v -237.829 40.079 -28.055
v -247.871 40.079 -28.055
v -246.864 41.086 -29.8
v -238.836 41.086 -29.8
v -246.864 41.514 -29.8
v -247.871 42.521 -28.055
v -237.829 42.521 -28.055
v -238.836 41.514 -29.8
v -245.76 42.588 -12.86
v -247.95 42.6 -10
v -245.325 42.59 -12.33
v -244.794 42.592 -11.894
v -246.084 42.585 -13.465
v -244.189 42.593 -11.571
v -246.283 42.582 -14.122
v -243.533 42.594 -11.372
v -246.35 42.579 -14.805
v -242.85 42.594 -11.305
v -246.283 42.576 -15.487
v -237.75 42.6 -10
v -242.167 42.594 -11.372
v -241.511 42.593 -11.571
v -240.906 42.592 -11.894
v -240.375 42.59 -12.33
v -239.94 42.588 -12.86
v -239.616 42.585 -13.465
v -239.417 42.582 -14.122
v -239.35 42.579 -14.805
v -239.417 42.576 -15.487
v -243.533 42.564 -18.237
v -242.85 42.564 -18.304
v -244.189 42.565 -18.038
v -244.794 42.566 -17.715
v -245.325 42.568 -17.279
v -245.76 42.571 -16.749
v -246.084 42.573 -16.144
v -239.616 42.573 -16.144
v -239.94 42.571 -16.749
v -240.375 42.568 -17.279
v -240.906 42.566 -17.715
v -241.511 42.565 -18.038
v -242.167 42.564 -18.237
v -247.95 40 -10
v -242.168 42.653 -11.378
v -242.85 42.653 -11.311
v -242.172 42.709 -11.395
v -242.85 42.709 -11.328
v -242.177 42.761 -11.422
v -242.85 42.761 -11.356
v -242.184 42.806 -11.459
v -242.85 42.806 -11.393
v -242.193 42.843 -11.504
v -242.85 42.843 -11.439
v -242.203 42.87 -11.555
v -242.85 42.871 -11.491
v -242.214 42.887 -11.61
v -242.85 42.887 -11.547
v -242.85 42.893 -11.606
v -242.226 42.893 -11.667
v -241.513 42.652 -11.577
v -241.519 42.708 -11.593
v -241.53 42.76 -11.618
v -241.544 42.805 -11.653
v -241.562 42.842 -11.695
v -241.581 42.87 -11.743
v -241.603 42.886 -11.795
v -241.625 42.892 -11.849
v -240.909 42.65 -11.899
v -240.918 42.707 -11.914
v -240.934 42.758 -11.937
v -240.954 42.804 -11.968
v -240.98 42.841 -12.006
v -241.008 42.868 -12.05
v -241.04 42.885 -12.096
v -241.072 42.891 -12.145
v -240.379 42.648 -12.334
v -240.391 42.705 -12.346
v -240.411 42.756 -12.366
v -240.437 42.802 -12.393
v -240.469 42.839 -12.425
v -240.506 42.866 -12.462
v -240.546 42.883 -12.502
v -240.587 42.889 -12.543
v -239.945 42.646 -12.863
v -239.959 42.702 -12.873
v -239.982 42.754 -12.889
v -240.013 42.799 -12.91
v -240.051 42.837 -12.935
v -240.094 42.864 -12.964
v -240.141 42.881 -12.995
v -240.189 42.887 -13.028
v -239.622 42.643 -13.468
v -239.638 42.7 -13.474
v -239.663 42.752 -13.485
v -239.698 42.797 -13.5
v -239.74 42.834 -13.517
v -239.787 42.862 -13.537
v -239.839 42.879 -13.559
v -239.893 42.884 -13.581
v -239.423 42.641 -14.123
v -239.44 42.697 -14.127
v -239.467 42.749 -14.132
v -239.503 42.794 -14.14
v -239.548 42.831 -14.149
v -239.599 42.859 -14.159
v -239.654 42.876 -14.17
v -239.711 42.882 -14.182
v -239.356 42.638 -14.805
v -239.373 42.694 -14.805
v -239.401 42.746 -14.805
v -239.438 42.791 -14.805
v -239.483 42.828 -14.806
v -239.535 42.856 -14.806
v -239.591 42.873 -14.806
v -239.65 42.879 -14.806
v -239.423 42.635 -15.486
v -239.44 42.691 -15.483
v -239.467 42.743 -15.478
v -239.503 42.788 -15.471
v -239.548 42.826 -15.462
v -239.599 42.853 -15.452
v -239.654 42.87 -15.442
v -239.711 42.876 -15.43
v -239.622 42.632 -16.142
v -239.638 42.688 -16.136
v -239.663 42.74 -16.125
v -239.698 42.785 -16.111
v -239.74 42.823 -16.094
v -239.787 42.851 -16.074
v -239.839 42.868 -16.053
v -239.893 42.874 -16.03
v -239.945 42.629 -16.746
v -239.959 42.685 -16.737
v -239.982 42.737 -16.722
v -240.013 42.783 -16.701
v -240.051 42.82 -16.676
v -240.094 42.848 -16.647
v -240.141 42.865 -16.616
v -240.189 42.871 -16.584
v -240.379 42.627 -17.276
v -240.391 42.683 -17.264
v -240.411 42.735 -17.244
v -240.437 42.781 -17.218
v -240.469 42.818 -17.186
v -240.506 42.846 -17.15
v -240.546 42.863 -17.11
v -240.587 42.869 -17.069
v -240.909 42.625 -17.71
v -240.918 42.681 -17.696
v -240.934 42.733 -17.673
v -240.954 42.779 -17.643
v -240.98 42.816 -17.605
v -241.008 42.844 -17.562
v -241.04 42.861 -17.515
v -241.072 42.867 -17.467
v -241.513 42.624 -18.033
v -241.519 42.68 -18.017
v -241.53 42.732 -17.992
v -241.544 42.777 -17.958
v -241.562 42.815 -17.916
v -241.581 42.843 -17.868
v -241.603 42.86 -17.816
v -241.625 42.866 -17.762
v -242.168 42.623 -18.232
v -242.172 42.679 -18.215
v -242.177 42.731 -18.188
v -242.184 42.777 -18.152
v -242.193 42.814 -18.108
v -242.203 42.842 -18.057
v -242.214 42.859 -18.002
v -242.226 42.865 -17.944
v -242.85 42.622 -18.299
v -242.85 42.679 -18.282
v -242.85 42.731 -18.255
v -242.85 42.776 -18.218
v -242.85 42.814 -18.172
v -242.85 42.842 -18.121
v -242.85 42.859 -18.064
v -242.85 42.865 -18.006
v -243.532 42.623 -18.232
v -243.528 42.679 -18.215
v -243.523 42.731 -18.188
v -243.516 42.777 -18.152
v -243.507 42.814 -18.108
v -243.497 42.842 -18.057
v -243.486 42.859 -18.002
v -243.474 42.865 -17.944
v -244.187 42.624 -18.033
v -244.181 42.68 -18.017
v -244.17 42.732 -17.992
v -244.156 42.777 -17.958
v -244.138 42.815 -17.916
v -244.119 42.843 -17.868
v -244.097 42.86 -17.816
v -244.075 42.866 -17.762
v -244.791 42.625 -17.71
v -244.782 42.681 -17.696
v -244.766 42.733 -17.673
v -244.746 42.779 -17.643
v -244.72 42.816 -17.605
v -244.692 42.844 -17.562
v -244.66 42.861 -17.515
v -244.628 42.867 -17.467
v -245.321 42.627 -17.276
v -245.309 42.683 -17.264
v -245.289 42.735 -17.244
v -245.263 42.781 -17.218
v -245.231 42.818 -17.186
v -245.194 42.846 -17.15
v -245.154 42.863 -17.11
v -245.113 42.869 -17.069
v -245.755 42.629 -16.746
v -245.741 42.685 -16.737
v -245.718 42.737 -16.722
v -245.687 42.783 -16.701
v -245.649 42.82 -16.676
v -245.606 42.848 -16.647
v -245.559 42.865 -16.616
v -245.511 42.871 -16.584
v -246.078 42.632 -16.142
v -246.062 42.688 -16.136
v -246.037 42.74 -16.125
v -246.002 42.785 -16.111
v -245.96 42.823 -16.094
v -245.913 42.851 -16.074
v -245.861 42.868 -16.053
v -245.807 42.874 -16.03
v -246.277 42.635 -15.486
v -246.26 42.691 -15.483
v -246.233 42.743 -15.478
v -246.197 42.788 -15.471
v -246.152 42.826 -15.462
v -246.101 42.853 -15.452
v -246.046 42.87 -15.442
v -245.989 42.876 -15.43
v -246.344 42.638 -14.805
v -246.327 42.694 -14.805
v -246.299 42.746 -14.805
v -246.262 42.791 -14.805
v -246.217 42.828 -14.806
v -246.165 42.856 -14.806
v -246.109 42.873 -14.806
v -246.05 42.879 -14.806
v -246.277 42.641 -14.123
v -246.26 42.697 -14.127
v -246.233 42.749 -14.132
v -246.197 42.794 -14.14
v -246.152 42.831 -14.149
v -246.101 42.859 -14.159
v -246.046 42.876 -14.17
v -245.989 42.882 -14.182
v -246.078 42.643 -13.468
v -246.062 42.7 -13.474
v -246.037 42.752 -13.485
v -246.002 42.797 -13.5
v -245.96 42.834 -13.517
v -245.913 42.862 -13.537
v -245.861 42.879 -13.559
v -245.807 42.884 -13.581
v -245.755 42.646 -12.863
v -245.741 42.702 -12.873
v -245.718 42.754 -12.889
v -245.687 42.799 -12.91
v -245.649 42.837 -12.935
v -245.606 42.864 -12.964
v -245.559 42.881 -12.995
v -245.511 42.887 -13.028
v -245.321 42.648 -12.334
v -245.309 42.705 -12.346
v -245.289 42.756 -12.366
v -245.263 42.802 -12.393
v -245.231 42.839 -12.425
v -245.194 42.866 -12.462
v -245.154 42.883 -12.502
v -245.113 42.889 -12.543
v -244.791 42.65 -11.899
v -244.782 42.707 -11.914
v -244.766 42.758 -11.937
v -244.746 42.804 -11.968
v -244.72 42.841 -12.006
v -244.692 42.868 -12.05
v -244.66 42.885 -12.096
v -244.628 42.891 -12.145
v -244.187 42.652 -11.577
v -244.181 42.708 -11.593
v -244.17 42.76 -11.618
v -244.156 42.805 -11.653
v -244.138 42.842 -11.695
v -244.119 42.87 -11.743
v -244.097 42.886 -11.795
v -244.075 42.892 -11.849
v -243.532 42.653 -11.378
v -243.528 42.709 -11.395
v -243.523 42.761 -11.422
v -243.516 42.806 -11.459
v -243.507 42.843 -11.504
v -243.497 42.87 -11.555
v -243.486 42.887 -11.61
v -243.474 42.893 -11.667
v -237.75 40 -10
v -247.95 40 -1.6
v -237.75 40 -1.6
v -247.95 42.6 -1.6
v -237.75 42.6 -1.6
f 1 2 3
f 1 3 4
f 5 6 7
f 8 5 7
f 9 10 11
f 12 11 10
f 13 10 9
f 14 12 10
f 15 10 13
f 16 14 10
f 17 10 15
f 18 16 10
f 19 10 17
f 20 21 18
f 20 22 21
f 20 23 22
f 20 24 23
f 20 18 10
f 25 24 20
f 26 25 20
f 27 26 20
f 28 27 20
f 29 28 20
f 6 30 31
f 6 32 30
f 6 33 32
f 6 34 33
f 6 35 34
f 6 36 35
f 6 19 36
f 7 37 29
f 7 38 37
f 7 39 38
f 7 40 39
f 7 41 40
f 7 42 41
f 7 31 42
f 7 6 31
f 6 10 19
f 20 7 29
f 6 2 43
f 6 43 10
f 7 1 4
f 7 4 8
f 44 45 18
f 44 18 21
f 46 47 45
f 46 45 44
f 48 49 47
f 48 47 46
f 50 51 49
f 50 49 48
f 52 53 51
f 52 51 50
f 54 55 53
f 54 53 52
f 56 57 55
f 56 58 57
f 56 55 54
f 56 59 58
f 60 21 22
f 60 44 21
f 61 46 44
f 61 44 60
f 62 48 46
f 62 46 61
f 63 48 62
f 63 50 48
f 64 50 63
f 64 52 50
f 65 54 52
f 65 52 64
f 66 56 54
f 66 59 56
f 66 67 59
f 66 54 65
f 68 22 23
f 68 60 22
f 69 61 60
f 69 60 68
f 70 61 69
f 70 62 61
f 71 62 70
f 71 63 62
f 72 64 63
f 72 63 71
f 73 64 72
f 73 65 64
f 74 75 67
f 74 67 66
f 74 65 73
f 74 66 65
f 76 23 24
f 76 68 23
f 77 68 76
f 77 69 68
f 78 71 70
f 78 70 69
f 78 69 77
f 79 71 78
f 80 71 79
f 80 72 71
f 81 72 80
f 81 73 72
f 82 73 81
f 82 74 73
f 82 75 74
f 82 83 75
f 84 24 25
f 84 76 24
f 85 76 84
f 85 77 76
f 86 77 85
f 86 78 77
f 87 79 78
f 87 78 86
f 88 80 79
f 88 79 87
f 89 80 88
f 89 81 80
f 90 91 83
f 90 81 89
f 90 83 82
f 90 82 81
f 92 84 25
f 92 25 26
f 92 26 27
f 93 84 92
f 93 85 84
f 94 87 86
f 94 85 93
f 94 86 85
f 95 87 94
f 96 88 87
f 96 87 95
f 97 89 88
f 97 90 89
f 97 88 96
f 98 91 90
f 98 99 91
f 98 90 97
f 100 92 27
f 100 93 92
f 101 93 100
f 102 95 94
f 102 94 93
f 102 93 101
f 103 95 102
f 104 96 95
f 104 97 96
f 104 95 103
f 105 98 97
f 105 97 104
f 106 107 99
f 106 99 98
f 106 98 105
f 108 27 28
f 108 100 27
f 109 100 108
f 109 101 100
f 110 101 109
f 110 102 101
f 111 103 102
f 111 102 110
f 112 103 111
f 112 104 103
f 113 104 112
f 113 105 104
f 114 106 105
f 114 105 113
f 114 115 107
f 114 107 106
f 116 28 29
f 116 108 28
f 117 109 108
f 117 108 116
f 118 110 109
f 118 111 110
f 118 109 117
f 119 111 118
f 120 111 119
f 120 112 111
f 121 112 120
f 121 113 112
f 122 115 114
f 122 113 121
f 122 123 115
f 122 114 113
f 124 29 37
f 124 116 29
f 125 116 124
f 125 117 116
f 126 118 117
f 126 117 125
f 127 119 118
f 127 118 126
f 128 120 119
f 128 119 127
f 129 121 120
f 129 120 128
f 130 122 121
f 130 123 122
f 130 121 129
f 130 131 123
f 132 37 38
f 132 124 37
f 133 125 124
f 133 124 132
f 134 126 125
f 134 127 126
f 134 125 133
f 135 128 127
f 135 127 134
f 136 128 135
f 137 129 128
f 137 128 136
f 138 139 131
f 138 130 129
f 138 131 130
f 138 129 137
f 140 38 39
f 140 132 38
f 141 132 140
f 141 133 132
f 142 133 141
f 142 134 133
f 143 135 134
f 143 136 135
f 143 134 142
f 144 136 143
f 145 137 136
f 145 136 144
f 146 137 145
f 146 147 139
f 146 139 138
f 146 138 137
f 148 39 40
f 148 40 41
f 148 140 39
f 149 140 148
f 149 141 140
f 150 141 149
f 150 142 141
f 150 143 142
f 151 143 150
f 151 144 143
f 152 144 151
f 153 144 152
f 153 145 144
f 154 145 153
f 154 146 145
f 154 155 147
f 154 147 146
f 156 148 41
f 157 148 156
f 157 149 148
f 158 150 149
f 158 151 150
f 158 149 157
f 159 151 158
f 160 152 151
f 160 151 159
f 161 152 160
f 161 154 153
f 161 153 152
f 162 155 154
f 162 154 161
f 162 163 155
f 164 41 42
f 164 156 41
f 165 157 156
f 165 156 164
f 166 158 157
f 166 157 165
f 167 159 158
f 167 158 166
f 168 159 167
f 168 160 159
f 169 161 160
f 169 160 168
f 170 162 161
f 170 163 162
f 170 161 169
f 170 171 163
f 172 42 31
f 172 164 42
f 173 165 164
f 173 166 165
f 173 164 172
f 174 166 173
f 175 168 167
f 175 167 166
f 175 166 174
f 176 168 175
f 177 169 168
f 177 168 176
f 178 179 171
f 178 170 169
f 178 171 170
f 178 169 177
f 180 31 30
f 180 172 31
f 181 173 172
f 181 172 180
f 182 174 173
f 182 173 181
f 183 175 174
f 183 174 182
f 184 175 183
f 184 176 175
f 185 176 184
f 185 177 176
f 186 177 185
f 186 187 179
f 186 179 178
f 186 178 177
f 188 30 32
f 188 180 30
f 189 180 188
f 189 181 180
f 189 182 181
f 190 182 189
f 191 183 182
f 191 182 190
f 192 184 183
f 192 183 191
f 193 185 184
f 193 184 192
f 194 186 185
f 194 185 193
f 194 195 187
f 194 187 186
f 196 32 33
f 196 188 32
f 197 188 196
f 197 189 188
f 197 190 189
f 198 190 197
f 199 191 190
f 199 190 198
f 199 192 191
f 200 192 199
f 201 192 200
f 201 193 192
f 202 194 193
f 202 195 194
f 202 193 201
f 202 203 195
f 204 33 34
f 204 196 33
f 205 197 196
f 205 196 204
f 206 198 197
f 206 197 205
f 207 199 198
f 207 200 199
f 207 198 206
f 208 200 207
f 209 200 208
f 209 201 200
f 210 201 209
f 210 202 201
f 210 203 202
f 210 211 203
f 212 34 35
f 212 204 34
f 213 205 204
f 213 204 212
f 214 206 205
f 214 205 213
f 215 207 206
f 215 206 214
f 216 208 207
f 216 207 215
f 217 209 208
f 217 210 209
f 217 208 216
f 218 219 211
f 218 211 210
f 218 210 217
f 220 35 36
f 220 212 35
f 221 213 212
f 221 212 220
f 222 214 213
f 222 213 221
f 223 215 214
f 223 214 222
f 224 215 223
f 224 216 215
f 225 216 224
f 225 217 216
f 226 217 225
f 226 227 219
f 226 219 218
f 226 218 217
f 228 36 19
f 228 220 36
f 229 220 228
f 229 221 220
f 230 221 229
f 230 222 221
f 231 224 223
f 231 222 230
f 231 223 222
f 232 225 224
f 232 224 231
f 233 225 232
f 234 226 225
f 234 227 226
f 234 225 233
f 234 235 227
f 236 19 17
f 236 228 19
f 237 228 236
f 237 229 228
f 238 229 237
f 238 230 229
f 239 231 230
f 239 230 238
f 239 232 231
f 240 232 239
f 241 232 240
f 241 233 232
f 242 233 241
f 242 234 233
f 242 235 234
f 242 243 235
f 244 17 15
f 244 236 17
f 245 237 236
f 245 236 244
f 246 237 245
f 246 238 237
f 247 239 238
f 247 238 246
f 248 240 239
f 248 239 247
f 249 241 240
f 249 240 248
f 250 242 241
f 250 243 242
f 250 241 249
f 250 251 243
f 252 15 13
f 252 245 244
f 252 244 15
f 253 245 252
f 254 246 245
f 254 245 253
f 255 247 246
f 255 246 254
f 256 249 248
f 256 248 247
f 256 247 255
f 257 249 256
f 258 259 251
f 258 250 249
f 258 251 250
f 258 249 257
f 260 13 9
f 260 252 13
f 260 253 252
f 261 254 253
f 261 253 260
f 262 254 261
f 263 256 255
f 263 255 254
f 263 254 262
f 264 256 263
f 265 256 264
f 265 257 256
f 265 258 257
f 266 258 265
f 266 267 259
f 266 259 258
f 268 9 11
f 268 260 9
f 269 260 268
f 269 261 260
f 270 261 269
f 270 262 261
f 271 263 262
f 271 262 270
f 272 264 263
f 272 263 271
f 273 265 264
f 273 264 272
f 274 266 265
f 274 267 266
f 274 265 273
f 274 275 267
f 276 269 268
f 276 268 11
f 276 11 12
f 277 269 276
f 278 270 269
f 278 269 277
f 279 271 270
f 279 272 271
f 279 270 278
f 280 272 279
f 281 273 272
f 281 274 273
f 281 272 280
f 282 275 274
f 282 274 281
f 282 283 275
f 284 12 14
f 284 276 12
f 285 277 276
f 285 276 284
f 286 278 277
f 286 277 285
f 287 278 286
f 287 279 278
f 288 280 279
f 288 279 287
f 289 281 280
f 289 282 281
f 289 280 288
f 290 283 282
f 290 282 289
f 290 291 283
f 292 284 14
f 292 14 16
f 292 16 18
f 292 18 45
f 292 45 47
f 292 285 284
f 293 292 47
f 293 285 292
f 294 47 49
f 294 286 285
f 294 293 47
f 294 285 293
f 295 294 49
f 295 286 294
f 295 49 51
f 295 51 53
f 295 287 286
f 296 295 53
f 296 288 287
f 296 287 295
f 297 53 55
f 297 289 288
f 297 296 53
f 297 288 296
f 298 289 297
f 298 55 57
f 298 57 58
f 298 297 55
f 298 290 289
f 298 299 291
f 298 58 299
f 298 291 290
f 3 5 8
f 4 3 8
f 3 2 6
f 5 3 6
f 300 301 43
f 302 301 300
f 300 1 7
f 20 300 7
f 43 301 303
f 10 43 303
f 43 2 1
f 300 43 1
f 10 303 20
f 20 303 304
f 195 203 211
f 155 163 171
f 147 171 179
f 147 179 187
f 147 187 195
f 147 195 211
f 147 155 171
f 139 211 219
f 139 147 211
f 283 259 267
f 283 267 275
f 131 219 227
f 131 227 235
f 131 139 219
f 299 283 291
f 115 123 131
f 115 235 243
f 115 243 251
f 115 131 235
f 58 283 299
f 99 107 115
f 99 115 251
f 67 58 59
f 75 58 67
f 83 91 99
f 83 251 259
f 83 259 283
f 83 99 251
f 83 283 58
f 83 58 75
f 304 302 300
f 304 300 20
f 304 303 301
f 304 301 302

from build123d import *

# Parameters (mm, degrees)
SHIM_TOP_START          = -1.6
SHIM_SKETCH_W           = 10.2
SHIM_SKETCH_H           = 2.6
SHIM_TOP_DEPTH          = 8.4
SHIM_BOTTOM_OUTLINE_W   = 10.027211308
SHIM_BOTTOM_OUTLINE_H   = 2.427211308
SHIM_BOTTOM_DEPTH       = 19.8
SHIM_BOTTOM_DRAFT       = -0.25
CHAMFER_2_SIZE          = 1
CHAMFER_2_SIZE2         = 1.745257156
RETAINING_BUMP_SKETCH_R = 3.5
RETAINING_BUMP_DEPTH    = 0.3
FILLET1_R               = 0.3


# Read off the part's stored shape, not the designer's step: shim_bottom
with BuildPart() as part:
    # shim_sketch → shim_top (new body)
    with BuildSketch(Plane.XY.offset(SHIM_TOP_START)):
        with Locations((-242.85, 41.3)):
            Rectangle(SHIM_SKETCH_W, SHIM_SKETCH_H)
    extrude(amount=-SHIM_TOP_DEPTH)


with BuildPart() as shim_bottom_tool:
    # shim_bottom outline → shim_bottom (with draft: the straight prism first)
    with BuildSketch(Plane.XY.offset(-29.8)):
        with Locations((-242.85, 41.3)):
            Rectangle(SHIM_BOTTOM_OUTLINE_W, SHIM_BOTTOM_OUTLINE_H)
    extrude(amount=SHIM_BOTTOM_DEPTH)
    # shim_bottom: the draft: its side faces are tilted about the plane it starts from
    shim_bottom_sides = [shim_bottom_tool.faces().sort_by_distance(p)[0] for p in [
        (-242.85, 40.086394346, -19.9),
        (-237.836394346, 41.3, -19.9),
        (-242.85, 42.513605654, -19.9),
        (-247.863605654, 41.3, -19.9),
    ]]
    draft(shim_bottom_sides, Plane.XY.offset(-29.8), SHIM_BOTTOM_DRAFT)


with BuildPart() as part_1:
    add(part.part)

    # shim_bottom: add shim_bottom_tool
    add(shim_bottom_tool.part)

    # Chamfer 2
    chamfer_2_edges = [part_1.edges().sort_by_distance(p)[0] for p in [
        (-237.836394346, 41.3, -29.8),
        (-242.85, 42.513605654, -29.8),
        (-247.863605654, 41.3, -29.8),
        (-242.85, 40.086394346, -29.8),
    ]]
    chamfer_2_side = [part_1.faces().sort_by_distance(p)[0] for p in [
        (-242.85, 41.3, -29.8),
    ]]
    chamfer(chamfer_2_edges, length=CHAMFER_2_SIZE, length2=CHAMFER_2_SIZE2, reference=chamfer_2_side[0])

    # retaining_bump_sketch → retaining_bump (add)
    with BuildSketch(Plane(origin=(0, 42.642821639, -0.186065591), x_dir=(1, 0, 0), z_dir=(0, 0.9999904807207346, -0.004363309284746581))):
        with Locations(Location((-242.85, 14.618579624, 0), (0, 0, 270))):
            Circle(RETAINING_BUMP_SKETCH_R)
    extrude(amount=RETAINING_BUMP_DEPTH)

    # Fillet1
    fillet1_edges = [part_1.edges().sort_by_distance(p)[0] for p in [
        (-242.85, 42.863761816, -18.305781732),
    ]]
    fillet(fillet1_edges, radius=FILLET1_R - 0.0001)  # a hair under: the kernel refuses the full size


solid = part_1.part
